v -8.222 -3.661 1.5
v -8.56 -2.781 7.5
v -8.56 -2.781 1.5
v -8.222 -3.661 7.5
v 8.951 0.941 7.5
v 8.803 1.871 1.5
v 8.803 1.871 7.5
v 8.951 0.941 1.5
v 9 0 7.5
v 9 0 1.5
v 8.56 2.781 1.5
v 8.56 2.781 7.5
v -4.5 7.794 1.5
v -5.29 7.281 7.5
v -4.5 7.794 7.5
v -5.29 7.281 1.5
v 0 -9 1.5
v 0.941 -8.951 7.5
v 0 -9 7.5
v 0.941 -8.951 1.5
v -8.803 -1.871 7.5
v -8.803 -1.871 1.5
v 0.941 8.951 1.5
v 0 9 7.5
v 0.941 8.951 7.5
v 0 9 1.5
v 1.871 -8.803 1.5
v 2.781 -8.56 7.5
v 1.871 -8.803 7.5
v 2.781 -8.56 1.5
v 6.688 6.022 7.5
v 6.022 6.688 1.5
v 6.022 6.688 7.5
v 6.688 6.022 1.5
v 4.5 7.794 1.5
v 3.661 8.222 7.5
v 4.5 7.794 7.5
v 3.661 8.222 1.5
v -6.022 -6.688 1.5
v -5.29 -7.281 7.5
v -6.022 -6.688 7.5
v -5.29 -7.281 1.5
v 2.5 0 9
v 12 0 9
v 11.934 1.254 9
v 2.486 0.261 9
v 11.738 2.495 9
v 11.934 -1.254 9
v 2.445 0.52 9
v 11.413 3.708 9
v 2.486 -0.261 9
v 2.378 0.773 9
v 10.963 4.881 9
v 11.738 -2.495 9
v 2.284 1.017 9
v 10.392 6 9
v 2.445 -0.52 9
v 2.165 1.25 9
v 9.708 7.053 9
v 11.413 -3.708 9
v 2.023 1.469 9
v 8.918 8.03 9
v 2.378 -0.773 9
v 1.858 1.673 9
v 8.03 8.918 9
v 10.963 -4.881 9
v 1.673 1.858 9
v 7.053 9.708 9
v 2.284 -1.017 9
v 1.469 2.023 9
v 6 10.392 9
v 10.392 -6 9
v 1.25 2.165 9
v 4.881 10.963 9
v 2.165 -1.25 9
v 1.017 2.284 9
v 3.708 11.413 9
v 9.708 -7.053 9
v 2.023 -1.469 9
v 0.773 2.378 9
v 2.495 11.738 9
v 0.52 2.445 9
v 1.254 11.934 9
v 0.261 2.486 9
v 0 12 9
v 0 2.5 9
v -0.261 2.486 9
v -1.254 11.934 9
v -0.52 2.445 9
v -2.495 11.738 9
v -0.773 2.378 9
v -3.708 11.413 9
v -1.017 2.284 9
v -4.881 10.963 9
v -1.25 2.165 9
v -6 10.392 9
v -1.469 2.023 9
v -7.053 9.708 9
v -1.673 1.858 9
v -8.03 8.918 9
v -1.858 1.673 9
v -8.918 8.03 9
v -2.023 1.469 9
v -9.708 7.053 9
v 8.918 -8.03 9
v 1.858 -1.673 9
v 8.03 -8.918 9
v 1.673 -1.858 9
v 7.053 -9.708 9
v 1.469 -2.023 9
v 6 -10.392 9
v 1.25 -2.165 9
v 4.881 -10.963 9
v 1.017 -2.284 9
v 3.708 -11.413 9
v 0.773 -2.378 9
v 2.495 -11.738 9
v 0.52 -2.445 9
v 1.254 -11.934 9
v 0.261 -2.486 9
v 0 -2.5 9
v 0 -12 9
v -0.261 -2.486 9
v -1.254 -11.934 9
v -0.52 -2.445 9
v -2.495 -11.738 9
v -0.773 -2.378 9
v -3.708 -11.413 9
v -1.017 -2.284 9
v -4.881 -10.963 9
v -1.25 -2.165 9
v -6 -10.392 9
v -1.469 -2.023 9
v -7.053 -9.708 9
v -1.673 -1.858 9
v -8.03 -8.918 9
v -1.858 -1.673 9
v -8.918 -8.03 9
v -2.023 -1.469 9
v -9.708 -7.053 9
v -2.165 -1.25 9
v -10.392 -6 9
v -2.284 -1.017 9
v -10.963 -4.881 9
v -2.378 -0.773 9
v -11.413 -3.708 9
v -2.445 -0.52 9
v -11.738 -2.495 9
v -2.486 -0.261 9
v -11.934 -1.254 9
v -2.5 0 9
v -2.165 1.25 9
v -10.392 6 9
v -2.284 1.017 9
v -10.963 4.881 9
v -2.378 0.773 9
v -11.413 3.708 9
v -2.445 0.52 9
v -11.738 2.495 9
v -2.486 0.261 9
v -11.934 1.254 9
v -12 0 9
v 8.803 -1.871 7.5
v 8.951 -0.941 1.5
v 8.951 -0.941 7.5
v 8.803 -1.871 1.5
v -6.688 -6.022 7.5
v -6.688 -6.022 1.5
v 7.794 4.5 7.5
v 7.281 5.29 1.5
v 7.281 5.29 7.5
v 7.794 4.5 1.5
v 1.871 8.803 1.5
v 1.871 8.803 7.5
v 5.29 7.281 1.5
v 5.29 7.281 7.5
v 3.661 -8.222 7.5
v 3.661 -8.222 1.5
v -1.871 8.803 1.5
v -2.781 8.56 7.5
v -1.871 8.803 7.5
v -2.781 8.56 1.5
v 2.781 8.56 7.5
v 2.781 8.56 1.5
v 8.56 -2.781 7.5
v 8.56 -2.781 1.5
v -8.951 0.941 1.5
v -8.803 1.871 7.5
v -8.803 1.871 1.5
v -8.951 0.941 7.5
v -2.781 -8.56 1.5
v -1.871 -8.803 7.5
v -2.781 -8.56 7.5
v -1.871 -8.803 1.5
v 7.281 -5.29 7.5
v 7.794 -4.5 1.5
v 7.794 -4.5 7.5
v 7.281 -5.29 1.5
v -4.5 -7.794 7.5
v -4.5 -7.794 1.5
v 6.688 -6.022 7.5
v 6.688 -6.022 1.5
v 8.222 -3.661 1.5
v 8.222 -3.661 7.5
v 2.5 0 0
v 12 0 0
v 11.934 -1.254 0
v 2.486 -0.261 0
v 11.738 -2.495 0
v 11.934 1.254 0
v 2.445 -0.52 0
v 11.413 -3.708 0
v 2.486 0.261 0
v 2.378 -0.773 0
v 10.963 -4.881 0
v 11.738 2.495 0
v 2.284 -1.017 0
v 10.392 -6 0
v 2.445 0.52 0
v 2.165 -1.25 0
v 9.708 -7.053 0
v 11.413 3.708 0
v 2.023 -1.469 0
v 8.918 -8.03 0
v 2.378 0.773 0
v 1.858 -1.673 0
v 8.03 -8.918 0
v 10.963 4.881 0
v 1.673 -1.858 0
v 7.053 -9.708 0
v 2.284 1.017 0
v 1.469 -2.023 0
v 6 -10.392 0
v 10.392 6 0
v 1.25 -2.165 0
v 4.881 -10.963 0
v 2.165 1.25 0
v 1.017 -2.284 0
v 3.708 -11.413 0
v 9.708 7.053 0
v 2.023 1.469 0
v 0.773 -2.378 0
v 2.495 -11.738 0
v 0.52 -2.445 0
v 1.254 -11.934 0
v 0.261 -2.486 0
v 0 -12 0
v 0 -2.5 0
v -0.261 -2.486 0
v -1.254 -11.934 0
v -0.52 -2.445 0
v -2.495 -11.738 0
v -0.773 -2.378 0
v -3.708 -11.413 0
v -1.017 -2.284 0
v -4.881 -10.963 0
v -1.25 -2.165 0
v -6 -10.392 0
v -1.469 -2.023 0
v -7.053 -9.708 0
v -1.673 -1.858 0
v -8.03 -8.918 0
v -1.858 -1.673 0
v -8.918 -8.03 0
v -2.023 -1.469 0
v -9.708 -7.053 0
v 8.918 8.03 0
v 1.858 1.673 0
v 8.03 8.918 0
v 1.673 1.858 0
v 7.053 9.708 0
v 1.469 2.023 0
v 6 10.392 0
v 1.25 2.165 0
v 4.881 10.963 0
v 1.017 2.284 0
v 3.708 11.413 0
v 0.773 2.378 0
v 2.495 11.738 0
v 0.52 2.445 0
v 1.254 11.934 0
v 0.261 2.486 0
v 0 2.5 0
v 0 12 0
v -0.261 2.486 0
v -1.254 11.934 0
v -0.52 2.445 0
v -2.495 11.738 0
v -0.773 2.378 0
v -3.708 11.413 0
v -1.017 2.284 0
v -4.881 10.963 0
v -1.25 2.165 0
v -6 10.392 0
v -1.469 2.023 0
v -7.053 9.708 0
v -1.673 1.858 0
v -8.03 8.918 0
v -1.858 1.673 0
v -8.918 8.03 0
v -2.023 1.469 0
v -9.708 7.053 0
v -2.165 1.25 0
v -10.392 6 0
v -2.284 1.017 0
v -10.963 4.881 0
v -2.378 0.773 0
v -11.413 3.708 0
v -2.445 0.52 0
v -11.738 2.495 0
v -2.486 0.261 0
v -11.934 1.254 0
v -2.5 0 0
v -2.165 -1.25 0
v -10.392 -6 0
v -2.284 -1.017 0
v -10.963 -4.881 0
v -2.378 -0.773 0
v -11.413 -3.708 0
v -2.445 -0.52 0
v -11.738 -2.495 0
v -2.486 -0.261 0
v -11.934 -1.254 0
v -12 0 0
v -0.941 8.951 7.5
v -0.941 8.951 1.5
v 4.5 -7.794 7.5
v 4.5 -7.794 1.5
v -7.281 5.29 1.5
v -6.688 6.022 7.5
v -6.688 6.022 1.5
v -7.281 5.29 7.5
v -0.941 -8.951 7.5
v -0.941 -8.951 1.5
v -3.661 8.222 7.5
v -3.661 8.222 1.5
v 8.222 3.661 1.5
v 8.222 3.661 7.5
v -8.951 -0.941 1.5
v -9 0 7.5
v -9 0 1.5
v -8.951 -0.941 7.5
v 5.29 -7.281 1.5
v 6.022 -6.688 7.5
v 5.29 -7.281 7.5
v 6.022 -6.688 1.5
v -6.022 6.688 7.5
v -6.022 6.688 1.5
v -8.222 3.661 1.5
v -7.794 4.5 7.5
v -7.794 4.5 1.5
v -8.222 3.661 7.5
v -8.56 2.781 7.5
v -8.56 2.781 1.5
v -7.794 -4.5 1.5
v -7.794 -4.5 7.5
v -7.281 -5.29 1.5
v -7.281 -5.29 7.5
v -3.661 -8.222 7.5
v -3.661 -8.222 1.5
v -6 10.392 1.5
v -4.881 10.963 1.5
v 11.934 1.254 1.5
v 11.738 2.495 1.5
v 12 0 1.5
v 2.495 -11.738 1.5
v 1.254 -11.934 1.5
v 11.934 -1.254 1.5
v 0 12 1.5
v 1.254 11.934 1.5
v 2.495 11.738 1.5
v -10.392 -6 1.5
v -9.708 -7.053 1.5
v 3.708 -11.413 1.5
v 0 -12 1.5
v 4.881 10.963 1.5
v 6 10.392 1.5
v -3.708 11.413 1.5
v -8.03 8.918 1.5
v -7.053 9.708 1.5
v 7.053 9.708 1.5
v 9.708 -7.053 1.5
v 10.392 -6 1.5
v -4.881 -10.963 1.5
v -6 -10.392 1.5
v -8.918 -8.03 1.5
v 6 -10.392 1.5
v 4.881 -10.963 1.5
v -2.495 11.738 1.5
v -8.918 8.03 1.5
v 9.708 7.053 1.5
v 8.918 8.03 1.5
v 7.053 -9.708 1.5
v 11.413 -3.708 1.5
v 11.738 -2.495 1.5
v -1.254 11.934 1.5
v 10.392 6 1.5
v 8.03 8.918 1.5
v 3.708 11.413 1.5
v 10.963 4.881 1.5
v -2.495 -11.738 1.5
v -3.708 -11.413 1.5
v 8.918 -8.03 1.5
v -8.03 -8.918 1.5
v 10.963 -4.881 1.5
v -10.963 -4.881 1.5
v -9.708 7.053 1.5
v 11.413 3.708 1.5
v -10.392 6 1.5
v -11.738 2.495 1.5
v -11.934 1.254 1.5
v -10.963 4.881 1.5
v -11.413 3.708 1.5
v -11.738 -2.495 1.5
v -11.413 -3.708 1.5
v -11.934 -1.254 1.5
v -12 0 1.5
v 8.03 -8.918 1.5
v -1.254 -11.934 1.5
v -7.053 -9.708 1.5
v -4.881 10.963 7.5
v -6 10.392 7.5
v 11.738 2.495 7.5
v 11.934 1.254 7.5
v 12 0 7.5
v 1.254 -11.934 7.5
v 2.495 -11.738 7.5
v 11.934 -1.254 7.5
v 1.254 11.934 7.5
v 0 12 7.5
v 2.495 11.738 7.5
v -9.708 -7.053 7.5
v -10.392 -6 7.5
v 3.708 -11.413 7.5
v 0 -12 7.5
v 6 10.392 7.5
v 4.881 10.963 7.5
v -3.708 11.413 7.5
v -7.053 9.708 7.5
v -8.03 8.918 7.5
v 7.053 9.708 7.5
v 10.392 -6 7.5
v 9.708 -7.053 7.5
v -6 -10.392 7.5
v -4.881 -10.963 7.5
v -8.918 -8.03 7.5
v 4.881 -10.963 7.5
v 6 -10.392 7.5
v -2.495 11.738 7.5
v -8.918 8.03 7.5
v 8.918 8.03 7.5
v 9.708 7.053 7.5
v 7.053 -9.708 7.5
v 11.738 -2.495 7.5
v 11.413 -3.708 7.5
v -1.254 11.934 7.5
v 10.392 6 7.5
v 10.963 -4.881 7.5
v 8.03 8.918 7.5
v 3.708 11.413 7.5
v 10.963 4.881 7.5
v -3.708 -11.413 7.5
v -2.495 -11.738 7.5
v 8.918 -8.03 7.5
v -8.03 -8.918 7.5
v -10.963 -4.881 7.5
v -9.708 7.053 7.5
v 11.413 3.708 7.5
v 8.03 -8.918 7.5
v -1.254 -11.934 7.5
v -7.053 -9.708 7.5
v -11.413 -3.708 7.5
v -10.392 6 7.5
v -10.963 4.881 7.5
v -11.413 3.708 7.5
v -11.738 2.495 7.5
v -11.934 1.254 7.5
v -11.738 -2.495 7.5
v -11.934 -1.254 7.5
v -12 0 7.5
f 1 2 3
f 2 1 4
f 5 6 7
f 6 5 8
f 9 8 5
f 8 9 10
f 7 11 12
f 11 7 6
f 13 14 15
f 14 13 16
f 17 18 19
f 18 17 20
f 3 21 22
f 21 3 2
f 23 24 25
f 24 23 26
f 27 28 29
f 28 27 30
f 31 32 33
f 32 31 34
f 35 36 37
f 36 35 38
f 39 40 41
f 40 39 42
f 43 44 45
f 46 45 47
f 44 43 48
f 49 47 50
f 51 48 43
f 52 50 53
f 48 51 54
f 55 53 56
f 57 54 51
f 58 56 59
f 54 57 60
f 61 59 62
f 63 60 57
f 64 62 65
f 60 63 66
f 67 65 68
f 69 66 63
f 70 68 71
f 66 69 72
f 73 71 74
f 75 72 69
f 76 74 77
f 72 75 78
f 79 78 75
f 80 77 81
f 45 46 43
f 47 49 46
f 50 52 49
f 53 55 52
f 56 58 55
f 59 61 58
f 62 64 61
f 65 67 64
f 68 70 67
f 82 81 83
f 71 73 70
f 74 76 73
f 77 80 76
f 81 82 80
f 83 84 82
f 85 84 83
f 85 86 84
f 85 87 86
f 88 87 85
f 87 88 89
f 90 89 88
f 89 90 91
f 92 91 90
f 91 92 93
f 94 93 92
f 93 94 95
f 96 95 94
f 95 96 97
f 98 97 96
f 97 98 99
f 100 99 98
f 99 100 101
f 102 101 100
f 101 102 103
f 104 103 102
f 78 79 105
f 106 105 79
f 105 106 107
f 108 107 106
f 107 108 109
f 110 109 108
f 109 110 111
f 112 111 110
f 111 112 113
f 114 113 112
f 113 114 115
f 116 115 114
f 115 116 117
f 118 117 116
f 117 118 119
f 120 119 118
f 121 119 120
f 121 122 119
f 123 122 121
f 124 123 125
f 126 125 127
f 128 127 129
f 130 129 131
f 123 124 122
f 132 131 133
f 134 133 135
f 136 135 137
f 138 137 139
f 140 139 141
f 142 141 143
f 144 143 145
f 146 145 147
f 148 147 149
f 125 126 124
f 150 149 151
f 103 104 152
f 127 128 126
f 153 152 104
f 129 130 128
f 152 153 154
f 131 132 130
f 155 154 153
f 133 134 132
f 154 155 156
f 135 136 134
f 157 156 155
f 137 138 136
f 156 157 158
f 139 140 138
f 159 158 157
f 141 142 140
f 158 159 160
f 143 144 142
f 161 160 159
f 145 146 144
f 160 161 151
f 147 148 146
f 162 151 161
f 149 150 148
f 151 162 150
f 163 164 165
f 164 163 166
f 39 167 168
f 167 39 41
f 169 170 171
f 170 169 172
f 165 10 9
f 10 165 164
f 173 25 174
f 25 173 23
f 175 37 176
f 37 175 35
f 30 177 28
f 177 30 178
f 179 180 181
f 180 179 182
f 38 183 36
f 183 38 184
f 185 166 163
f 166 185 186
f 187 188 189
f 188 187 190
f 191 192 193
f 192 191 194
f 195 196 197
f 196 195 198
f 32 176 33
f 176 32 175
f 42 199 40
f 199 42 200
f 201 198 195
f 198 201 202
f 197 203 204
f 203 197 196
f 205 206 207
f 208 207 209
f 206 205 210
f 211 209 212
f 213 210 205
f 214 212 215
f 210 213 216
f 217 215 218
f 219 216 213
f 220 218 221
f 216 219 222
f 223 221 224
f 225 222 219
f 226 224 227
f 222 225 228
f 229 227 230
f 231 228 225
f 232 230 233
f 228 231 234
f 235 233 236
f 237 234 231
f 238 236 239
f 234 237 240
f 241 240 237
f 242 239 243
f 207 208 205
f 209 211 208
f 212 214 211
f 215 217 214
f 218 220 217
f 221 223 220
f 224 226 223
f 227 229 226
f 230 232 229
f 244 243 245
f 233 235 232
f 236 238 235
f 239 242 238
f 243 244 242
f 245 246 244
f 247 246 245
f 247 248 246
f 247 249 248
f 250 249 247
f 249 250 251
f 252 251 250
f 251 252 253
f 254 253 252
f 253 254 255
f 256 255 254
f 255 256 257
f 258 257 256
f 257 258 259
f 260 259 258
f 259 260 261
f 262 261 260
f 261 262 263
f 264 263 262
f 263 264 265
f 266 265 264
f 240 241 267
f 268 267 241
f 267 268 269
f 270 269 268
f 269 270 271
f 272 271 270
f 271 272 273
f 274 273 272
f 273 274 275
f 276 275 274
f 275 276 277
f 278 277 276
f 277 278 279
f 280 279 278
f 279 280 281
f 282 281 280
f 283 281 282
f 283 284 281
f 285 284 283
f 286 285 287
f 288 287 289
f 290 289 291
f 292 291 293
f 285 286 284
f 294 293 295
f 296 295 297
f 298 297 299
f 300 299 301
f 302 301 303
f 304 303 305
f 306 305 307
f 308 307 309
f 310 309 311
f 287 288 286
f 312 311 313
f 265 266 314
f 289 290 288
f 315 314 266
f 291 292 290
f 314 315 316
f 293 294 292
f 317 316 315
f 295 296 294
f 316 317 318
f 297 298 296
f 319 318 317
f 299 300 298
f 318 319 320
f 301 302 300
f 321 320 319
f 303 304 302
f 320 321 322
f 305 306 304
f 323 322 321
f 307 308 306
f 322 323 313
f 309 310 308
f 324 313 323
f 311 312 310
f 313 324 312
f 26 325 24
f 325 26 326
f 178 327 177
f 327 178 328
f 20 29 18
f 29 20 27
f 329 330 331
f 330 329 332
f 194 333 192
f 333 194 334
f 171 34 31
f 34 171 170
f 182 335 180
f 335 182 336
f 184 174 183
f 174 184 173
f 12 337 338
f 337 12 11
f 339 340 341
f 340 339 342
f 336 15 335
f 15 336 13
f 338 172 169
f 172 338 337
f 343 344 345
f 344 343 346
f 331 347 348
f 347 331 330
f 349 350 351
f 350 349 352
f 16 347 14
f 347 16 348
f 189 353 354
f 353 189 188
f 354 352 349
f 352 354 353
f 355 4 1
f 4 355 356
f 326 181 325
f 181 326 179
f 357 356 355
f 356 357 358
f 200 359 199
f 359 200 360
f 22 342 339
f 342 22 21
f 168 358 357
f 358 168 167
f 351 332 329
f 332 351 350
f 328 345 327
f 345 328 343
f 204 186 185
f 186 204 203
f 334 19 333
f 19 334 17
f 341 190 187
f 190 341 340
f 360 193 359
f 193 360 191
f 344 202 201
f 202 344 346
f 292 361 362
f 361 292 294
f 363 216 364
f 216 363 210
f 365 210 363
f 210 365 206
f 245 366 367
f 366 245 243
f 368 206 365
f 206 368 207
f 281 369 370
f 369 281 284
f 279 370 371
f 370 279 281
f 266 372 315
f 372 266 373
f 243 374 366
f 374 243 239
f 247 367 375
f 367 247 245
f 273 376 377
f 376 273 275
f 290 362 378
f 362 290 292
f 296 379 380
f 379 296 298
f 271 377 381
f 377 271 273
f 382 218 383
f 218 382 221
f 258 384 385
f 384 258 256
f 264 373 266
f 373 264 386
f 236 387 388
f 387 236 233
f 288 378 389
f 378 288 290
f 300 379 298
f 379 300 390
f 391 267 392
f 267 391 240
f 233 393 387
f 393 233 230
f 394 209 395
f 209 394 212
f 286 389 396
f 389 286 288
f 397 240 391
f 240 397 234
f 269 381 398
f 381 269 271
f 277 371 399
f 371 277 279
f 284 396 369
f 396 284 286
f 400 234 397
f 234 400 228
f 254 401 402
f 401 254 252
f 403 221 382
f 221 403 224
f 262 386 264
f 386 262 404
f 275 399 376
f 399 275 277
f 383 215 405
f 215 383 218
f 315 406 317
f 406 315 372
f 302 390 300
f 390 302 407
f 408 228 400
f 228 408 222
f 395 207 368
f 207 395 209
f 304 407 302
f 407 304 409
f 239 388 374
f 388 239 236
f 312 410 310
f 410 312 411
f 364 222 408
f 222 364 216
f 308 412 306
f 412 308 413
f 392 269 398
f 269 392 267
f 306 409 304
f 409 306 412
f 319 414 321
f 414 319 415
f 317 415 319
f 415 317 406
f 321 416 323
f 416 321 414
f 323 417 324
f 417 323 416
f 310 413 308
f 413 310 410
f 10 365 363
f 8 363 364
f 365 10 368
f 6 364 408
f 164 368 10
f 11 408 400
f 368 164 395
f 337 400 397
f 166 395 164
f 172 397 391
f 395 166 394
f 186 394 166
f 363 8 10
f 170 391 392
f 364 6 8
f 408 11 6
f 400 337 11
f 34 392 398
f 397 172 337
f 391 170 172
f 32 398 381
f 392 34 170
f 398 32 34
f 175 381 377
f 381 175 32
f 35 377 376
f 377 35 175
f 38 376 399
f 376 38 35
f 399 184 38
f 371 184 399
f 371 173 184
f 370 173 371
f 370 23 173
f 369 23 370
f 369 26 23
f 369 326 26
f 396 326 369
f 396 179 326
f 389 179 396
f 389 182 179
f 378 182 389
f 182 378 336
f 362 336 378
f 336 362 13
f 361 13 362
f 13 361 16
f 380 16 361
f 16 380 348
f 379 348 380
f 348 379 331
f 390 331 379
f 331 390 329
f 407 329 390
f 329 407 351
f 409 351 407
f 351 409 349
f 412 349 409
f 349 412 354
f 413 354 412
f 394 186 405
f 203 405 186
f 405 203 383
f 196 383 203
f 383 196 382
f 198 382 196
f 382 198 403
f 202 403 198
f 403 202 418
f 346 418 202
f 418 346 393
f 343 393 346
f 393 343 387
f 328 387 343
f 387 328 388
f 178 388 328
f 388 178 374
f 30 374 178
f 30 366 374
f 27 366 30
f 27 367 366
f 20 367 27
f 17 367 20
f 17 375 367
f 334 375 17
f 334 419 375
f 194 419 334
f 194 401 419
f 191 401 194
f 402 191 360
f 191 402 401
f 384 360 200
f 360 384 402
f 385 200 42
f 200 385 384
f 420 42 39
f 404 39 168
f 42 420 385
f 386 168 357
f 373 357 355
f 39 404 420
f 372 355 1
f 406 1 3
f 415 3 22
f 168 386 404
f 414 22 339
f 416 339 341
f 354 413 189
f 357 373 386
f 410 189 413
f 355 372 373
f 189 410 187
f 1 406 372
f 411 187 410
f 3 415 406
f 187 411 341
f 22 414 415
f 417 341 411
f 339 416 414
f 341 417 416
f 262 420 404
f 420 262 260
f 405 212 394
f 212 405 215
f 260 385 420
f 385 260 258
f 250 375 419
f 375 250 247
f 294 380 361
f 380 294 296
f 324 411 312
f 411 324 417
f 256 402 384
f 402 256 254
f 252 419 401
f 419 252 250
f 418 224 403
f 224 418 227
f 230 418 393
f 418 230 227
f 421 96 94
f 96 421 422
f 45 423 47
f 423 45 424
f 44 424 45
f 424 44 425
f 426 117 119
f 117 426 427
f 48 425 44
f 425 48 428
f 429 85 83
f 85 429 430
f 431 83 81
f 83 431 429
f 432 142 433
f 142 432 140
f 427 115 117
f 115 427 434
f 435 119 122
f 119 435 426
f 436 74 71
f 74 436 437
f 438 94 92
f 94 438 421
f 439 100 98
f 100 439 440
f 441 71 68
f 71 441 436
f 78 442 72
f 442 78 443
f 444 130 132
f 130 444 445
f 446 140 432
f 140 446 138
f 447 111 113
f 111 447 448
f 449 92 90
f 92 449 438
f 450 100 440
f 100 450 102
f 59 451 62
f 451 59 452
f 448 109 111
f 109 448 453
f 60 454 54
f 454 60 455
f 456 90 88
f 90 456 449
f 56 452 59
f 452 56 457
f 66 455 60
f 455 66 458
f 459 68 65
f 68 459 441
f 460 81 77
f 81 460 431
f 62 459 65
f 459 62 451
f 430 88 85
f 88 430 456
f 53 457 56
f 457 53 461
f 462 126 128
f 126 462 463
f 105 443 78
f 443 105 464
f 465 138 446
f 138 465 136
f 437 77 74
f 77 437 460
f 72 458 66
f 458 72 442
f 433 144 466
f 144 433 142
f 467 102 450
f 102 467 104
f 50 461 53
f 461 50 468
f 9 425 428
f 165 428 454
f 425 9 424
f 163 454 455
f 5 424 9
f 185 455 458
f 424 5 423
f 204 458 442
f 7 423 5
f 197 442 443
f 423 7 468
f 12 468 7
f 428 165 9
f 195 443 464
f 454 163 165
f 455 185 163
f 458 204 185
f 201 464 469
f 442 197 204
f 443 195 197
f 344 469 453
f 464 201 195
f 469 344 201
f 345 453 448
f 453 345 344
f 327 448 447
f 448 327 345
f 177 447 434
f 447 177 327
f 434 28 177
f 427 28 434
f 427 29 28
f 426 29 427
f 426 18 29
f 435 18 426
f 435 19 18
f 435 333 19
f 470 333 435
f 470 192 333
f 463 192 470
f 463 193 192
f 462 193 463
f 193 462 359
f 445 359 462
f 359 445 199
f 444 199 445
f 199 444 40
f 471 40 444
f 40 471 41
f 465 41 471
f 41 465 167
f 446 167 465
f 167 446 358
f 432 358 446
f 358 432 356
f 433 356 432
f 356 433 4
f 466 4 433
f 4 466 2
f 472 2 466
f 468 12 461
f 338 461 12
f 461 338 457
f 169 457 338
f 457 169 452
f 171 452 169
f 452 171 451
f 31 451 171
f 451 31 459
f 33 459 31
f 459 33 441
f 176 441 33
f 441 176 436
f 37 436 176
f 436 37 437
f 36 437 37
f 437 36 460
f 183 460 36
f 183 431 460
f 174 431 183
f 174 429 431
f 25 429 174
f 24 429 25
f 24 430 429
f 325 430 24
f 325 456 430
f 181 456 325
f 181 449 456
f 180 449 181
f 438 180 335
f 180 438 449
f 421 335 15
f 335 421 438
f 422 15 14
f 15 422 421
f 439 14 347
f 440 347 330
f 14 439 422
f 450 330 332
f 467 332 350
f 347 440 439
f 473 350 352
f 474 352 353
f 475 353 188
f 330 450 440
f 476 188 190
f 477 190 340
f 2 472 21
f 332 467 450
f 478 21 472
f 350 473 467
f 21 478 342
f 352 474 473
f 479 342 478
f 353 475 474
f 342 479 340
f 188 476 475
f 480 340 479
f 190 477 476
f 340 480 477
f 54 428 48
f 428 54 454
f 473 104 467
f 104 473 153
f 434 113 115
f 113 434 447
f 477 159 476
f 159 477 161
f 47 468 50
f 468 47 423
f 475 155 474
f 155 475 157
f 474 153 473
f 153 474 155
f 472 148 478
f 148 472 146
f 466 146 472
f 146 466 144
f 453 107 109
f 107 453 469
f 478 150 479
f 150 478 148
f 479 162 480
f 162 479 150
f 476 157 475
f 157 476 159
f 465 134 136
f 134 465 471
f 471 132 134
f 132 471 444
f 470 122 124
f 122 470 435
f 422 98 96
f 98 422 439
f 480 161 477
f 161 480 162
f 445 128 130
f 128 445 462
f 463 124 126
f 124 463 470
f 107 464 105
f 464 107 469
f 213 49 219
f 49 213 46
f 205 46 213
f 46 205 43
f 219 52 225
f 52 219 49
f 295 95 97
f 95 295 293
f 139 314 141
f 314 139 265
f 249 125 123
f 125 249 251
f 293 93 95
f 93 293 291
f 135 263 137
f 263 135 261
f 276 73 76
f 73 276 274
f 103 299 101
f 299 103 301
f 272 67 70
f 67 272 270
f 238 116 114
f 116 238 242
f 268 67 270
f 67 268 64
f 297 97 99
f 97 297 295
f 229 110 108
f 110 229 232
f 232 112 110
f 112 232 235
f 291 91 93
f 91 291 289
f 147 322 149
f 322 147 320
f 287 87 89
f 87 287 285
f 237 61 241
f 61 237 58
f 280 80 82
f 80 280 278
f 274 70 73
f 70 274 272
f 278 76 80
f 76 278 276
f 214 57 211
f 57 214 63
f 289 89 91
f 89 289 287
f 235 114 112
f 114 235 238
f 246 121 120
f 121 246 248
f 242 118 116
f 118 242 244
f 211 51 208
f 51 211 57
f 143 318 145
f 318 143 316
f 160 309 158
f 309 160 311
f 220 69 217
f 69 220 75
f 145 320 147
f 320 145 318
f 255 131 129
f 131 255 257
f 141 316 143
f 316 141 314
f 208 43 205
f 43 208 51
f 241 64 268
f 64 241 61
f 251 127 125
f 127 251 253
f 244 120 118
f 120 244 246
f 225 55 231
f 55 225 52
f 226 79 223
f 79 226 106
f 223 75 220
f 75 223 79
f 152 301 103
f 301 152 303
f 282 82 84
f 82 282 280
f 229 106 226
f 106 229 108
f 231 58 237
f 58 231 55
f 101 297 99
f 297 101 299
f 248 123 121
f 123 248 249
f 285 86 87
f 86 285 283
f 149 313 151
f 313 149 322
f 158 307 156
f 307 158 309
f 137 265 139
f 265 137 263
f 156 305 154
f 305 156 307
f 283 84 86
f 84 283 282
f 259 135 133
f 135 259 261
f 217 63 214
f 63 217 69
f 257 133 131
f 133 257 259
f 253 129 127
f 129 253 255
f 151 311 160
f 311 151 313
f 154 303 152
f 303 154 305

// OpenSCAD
// Belt-guide pulley flange.
$fn = 60;
eps = 0.02;
bore_d = 5;
body_d = 18;
width = 9;
difference() { union() { cylinder(d=body_d,h=width); cylinder(d=body_d+6,h=1.5); translate([0,0,width-1.5]) cylinder(d=body_d+6,h=1.5); } translate([0,0,-eps]) cylinder(d=bore_d,h=width+2*eps); }
